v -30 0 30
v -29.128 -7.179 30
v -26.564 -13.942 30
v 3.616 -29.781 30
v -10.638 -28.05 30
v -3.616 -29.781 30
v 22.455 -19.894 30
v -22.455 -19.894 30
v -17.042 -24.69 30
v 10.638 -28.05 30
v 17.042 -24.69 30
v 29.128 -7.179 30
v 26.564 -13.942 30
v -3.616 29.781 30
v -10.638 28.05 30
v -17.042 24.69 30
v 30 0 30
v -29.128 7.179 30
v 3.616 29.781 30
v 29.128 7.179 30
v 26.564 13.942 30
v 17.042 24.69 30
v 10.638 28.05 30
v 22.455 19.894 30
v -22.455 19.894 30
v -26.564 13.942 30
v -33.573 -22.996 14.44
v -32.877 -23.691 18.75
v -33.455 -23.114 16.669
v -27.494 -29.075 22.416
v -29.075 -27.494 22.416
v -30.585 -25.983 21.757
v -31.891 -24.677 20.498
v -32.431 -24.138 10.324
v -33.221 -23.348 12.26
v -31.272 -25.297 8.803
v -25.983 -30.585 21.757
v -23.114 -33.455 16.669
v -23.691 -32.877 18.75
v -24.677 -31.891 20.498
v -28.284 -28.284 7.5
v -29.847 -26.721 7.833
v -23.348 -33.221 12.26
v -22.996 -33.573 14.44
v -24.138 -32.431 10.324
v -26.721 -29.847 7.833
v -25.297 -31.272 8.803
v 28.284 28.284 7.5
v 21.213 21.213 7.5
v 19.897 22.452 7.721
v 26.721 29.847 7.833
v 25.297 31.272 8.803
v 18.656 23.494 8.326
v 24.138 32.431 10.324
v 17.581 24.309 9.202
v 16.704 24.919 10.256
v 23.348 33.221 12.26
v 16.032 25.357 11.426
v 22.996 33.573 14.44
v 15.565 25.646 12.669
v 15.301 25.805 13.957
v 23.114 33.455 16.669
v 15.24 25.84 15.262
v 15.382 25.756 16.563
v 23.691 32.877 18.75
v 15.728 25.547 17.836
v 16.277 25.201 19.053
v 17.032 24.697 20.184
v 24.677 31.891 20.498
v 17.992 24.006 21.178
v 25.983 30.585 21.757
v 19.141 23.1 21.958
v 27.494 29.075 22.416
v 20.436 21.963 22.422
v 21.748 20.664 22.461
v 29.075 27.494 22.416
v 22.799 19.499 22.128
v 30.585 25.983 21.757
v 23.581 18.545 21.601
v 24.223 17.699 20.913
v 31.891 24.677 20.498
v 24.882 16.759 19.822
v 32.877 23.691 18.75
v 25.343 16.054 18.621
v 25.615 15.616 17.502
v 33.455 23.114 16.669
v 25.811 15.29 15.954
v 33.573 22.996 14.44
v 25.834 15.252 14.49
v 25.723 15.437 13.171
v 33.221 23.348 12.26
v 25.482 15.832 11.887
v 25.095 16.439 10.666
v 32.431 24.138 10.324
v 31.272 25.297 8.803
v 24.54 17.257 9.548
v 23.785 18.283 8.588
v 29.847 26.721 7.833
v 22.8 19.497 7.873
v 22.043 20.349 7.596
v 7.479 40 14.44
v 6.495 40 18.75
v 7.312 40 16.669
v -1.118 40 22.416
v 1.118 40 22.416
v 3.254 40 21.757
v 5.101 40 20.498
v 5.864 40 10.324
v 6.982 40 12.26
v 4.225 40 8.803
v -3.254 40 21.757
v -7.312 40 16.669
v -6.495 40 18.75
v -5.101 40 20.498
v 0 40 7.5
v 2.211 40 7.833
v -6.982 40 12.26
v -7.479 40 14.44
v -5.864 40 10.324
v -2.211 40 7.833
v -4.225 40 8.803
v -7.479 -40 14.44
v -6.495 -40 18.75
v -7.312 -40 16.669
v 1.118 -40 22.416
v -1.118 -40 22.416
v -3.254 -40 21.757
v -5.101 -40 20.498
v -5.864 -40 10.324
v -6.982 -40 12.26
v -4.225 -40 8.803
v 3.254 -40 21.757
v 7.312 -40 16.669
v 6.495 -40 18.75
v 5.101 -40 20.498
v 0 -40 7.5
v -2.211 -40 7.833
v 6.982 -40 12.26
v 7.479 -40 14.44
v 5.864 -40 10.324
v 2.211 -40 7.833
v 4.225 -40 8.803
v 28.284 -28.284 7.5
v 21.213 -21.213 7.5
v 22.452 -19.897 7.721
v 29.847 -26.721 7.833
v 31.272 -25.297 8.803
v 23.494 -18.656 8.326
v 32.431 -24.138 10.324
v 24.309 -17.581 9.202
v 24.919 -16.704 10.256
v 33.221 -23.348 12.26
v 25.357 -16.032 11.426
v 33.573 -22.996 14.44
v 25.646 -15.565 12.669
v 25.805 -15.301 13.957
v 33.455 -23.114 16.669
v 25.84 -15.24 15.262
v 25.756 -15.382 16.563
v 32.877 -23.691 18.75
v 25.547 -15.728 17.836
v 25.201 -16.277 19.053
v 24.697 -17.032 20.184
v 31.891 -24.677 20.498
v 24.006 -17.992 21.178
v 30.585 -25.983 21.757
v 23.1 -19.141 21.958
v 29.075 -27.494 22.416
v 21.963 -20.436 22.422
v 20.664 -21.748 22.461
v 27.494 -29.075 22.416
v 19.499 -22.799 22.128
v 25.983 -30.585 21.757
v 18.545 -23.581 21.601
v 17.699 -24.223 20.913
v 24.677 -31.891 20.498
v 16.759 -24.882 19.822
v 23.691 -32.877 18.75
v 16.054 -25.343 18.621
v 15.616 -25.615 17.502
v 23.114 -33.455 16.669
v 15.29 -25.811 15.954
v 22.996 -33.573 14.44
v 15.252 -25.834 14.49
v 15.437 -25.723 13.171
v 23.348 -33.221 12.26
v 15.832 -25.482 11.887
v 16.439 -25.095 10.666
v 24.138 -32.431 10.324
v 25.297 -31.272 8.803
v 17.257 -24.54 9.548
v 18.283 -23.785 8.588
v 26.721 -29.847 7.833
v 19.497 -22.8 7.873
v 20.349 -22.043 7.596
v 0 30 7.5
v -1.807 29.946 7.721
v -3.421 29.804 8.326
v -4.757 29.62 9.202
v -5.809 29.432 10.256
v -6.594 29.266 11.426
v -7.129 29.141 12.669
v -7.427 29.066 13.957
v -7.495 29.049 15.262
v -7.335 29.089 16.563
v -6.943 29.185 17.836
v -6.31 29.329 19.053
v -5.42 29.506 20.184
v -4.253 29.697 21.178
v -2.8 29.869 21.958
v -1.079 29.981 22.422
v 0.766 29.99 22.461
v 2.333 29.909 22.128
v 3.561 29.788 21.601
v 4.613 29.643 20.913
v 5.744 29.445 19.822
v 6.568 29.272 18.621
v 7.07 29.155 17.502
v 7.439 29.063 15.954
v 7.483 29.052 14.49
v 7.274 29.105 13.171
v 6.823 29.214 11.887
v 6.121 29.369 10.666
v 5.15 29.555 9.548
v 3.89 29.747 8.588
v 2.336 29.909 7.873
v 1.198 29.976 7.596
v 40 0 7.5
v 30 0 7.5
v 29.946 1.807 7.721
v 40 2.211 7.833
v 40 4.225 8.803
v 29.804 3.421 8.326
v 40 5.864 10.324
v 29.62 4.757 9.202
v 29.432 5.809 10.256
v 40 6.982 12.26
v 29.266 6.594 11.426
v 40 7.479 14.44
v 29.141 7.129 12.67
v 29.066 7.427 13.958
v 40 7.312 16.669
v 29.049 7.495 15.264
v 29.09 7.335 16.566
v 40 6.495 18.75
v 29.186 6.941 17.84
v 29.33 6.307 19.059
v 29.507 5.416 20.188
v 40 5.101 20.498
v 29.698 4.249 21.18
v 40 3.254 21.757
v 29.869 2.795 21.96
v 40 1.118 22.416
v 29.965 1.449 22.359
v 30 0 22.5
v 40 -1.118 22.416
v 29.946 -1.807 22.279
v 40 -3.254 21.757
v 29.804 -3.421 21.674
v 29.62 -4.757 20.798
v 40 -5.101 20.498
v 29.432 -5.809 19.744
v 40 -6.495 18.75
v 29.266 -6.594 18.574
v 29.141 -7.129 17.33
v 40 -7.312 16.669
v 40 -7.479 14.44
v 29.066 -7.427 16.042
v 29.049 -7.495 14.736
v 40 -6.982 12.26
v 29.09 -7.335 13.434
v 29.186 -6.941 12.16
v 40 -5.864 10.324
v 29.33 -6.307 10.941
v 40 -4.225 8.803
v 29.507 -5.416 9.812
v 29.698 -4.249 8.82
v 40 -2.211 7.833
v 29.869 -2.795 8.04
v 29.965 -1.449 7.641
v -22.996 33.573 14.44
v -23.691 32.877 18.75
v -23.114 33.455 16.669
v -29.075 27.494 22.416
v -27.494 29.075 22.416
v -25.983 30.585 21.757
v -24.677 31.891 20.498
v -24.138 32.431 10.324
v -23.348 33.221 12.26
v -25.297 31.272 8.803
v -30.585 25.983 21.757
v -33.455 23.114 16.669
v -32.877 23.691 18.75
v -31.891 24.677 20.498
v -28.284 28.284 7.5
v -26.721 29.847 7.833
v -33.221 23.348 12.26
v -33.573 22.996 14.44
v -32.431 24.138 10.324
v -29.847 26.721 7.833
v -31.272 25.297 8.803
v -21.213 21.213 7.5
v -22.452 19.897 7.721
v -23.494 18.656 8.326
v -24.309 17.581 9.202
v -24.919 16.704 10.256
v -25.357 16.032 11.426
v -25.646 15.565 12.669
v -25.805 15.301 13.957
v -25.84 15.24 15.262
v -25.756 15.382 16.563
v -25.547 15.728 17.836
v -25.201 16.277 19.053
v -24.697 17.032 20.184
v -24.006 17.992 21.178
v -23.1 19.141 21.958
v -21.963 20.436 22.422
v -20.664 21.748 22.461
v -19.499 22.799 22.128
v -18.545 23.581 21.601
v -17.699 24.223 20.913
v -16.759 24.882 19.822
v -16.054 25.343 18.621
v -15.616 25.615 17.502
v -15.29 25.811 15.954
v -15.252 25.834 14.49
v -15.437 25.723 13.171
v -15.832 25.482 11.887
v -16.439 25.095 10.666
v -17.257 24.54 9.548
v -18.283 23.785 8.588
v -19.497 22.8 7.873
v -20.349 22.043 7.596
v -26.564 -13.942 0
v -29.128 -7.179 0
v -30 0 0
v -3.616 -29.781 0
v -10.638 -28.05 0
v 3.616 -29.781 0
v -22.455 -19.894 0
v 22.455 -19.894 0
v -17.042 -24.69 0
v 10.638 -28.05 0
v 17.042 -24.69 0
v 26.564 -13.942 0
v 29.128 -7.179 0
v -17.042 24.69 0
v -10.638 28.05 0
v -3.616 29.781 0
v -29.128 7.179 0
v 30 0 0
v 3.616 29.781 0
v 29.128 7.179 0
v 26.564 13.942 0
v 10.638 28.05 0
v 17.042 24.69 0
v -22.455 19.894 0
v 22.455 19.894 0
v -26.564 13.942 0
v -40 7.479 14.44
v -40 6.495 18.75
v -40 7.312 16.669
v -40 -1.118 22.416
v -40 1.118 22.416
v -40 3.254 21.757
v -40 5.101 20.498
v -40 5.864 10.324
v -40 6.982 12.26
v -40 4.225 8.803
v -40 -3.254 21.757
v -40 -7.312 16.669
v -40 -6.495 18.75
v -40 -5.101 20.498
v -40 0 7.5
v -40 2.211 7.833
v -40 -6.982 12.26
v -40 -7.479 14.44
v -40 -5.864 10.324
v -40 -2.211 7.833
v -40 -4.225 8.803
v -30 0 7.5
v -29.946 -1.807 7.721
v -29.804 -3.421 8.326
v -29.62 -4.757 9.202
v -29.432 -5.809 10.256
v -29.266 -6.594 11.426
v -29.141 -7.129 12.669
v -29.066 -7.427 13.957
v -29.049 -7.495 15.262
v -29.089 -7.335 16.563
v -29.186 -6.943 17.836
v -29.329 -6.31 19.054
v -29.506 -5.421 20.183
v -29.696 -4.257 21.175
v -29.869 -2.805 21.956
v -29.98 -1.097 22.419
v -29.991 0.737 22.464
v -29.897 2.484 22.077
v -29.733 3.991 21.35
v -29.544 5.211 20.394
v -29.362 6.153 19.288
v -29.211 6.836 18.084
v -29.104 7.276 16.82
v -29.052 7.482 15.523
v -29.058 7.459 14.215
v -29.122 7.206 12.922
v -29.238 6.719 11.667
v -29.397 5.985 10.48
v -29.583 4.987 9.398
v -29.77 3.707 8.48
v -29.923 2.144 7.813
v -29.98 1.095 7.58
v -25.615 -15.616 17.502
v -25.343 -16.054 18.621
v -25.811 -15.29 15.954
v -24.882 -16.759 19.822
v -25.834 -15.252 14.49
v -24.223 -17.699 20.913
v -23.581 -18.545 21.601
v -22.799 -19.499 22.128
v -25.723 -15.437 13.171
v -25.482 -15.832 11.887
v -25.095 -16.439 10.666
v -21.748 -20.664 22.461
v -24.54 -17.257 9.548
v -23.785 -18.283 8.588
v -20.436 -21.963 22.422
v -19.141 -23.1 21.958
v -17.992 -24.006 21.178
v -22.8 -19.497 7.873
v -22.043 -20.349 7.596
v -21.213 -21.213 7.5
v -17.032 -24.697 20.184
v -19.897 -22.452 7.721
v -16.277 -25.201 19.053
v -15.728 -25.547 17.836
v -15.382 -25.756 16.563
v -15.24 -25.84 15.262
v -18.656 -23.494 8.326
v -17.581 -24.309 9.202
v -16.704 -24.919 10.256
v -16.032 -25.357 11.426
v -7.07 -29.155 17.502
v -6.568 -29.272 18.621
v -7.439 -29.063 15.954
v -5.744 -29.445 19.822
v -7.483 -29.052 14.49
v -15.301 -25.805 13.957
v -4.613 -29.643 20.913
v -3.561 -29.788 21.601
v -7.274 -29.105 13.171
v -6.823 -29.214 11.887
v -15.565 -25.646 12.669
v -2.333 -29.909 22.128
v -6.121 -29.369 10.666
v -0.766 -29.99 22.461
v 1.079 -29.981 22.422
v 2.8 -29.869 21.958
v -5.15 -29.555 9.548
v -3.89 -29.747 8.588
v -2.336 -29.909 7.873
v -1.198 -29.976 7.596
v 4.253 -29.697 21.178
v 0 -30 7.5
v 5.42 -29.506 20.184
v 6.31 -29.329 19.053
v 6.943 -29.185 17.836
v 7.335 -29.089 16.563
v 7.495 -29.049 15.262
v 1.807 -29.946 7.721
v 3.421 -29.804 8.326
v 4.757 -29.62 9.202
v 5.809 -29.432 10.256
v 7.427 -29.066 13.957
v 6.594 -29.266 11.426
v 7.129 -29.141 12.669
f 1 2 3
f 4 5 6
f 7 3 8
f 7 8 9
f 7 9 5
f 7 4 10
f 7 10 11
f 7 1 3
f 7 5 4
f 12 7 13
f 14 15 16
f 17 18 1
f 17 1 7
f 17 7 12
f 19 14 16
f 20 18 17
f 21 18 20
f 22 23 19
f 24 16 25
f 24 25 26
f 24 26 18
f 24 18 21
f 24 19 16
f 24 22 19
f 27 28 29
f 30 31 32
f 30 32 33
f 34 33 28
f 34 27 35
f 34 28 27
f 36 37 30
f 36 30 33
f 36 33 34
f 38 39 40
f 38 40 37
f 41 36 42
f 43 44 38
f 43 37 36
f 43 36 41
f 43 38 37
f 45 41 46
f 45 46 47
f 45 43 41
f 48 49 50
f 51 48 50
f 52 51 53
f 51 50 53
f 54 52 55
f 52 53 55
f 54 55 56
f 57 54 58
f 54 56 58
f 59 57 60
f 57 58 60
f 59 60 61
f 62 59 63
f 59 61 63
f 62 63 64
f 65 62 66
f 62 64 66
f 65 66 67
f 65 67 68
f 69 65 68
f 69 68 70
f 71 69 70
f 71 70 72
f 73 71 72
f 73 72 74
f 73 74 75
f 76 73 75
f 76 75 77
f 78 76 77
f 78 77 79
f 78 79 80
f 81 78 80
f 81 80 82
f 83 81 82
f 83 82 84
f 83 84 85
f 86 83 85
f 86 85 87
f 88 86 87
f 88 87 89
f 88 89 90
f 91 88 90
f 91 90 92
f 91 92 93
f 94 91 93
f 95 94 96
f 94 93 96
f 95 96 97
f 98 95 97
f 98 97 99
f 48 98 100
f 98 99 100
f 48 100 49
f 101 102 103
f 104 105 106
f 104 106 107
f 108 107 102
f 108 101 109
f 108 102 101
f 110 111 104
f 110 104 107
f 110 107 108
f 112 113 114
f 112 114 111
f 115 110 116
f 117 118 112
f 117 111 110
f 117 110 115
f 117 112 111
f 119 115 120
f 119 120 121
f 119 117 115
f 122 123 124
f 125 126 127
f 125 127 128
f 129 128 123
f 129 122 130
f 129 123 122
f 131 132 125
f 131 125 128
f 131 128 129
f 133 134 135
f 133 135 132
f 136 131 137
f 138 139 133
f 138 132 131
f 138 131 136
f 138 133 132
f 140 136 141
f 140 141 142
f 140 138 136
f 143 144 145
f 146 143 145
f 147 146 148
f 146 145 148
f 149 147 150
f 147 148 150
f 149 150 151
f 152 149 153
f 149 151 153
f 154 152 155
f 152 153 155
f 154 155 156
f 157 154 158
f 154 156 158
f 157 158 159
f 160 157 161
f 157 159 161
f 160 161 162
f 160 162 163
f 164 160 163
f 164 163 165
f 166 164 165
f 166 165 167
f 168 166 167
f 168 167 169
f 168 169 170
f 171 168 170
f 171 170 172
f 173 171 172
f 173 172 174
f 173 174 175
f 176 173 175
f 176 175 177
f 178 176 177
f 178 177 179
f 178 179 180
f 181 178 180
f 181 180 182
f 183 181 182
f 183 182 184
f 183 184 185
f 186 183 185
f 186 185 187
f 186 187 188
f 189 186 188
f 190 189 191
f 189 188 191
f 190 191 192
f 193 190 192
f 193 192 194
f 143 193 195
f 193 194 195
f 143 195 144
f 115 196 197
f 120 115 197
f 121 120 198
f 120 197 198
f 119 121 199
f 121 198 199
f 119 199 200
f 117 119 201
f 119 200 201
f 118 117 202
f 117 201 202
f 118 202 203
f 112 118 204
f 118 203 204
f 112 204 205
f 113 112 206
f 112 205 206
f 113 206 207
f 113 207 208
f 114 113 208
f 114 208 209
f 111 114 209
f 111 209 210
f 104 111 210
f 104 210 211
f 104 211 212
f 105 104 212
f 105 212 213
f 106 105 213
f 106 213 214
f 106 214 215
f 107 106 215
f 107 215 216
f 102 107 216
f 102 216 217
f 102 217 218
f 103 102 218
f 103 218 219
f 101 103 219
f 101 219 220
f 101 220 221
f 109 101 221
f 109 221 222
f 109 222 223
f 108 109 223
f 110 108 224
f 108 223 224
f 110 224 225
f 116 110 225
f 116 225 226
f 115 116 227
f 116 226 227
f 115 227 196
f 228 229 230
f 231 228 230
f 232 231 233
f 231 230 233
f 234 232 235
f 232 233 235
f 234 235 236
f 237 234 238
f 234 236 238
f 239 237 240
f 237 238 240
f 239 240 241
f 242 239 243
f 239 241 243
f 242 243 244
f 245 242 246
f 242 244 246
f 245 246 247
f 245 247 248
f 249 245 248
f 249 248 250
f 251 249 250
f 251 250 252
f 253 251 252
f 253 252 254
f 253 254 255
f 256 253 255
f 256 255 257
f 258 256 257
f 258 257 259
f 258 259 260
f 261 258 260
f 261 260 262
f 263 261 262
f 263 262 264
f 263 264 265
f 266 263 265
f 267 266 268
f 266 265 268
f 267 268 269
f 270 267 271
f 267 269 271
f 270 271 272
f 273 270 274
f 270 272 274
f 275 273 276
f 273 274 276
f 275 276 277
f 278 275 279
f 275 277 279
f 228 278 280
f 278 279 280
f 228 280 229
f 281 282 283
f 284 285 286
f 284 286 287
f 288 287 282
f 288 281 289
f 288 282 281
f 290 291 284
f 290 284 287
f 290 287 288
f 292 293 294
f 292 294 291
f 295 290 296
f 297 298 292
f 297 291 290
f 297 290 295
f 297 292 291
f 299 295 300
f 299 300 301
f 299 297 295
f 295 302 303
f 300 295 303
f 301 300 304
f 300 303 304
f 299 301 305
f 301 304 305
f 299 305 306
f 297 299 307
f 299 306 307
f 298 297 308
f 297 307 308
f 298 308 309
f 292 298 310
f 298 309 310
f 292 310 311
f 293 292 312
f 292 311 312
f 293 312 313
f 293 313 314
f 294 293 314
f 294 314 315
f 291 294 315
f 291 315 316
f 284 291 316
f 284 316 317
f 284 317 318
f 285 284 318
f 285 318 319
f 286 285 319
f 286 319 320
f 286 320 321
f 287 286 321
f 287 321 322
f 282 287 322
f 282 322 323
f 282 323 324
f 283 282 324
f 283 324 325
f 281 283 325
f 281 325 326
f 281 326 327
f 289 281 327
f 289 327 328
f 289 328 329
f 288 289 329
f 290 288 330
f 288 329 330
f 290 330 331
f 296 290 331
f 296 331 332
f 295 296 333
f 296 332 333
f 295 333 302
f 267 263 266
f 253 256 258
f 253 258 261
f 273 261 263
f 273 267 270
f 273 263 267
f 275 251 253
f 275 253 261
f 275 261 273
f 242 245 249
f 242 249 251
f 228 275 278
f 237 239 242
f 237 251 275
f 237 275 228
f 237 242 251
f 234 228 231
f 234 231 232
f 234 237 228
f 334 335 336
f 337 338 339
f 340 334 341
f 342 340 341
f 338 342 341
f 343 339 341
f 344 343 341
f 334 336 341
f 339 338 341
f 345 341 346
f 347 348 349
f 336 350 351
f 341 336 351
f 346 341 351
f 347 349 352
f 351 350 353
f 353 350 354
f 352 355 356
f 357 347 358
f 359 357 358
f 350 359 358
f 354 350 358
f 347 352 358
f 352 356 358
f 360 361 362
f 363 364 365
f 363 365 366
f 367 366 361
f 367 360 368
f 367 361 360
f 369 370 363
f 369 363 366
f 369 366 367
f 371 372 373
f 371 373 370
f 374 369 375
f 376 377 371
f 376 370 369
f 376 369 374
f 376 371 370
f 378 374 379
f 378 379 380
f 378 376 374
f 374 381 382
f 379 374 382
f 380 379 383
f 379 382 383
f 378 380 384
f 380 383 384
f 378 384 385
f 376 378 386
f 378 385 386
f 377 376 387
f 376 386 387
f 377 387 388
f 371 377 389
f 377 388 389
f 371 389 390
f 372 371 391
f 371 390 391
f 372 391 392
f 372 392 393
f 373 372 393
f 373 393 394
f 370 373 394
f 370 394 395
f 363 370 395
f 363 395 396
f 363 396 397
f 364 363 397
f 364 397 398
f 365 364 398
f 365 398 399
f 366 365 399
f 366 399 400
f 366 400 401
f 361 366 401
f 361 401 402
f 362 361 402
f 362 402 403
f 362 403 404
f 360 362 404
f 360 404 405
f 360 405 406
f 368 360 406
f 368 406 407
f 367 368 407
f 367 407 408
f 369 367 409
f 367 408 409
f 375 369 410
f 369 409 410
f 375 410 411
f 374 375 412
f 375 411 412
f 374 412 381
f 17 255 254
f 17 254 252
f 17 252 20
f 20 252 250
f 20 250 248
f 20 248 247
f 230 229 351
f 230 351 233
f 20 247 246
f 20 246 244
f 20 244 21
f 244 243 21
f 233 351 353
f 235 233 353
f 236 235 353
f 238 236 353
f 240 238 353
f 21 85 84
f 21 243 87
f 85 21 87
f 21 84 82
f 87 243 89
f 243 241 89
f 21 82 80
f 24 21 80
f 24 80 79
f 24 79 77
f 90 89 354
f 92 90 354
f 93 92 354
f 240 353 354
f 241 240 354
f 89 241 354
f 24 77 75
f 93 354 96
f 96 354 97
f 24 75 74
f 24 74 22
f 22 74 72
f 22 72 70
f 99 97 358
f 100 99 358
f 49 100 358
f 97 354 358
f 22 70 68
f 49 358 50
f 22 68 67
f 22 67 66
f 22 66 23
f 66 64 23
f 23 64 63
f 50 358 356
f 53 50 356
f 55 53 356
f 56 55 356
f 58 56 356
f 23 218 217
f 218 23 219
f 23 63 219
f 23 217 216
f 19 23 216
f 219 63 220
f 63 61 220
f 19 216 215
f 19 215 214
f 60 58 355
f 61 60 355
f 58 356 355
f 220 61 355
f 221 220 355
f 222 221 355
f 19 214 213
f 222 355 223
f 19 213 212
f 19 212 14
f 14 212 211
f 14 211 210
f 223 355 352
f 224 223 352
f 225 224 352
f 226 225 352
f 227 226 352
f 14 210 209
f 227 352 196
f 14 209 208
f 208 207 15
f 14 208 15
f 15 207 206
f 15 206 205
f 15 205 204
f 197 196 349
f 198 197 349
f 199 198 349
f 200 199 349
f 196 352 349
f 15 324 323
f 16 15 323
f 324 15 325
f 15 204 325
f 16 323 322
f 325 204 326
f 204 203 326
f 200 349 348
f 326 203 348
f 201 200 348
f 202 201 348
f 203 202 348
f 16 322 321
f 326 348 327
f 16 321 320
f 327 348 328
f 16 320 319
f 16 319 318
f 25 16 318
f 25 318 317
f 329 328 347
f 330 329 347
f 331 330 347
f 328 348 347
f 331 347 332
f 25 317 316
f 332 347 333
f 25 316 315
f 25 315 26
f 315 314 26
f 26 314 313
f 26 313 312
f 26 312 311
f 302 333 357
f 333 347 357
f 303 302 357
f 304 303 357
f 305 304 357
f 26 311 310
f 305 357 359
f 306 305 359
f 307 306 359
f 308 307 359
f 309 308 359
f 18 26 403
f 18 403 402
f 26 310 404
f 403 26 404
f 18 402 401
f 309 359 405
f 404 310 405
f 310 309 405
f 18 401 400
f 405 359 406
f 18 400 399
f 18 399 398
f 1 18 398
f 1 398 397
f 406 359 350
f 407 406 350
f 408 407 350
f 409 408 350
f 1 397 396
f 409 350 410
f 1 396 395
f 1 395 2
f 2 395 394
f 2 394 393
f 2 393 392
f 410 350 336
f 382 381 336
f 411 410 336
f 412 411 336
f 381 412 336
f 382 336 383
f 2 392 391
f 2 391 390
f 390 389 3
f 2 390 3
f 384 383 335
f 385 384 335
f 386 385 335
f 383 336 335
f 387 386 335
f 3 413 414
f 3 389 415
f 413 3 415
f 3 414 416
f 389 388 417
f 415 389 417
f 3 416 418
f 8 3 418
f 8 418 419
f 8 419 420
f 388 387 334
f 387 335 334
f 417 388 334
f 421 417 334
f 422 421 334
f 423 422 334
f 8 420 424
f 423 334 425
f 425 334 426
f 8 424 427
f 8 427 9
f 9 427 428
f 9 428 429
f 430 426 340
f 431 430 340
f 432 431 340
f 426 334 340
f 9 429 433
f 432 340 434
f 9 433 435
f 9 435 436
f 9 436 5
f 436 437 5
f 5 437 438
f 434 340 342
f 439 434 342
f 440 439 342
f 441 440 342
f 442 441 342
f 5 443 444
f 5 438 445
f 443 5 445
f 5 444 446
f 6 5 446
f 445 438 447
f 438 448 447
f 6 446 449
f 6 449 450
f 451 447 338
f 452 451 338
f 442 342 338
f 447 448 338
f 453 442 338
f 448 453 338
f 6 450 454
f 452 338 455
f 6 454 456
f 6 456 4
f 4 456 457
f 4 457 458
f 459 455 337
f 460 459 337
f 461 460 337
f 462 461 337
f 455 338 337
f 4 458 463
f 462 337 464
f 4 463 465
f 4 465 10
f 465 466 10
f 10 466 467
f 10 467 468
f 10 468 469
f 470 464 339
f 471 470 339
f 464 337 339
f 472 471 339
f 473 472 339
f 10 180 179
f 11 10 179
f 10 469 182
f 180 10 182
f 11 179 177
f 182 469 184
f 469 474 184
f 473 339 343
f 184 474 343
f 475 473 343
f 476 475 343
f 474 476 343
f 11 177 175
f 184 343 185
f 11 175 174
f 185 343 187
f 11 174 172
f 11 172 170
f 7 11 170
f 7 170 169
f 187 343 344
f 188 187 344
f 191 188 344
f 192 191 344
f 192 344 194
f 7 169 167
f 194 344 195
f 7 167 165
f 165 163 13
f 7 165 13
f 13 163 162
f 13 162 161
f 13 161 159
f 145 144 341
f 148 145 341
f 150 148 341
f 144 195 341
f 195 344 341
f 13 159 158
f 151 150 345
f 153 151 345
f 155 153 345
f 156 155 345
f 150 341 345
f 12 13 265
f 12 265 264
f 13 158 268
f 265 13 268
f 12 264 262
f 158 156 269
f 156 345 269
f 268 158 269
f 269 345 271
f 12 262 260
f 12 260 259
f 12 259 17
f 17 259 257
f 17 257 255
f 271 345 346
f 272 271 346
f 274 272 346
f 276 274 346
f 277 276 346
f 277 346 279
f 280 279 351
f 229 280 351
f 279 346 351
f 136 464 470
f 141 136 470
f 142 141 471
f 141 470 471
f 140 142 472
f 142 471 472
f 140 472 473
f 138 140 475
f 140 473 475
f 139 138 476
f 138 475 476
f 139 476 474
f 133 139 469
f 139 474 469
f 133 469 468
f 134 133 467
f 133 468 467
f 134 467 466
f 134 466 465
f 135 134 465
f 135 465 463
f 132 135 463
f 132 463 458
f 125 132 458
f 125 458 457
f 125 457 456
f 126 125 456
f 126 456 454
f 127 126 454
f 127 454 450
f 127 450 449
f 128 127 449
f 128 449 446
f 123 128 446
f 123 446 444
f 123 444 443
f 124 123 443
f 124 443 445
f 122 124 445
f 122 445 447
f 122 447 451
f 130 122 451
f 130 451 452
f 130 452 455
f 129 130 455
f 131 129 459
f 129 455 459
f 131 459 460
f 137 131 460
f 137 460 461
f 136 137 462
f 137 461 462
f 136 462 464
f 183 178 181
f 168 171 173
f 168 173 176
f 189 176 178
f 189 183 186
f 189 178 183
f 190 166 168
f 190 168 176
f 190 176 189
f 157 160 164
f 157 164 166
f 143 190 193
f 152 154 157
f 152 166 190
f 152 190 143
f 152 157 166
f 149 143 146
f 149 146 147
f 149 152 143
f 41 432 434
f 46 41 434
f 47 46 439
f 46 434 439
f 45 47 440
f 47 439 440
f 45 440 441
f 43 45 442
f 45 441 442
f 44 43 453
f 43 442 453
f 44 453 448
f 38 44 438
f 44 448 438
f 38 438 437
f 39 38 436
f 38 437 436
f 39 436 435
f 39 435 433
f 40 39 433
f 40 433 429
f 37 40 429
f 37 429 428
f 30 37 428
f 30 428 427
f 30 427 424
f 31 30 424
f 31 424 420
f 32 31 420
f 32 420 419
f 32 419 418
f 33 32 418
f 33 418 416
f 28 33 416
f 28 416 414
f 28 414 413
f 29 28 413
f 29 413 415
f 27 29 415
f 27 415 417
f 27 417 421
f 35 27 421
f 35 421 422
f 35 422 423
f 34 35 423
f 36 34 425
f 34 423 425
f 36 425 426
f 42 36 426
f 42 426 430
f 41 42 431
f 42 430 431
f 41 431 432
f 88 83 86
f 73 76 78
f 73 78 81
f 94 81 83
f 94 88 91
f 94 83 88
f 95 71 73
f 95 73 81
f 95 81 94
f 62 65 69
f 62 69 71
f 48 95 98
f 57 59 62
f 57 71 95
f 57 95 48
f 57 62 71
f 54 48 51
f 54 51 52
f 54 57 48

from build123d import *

# Parameters (mm, degrees)
SKIZZE1_R                       = 30
AUFSATZ_LINEAR_AUSTRAGEN1_DEPTH = 30
SKIZZE2_R                       = 7.5
AUFSATZ_LINEAR_AUSTRAGEN2_DEPTH = 40
KREISMUSTER1_COUNT              = 8


with BuildPart() as part:
    # Skizze1 → Aufsatz-Linear austragen1 (new body)
    with BuildSketch(Plane.XY):
        Circle(SKIZZE1_R)
    extrude(amount=AUFSATZ_LINEAR_AUSTRAGEN1_DEPTH)

    # Skizze2 → Aufsatz-Linear austragen2 (add)
    with BuildSketch(Plane(origin=(0, 0, 0), x_dir=(1, 0, 0), z_dir=(0, 1, 0))):
        with Locations(Location((0, -15, 0), (0, 0, 90))):
            Circle(SKIZZE2_R)
    aufsatz_linear_austragen2 = extrude(amount=AUFSATZ_LINEAR_AUSTRAGEN2_DEPTH)

    # Kreismuster1: Aufsatz-Linear austragen2 ×8 about axis
    kreismuster1_axis = Axis((0, 0, 0), (0, 0, 1))
    for i in range(1, KREISMUSTER1_COUNT):
        add(aufsatz_linear_austragen2.rotate(kreismuster1_axis, i * 360 / KREISMUSTER1_COUNT))


solid = part.part
